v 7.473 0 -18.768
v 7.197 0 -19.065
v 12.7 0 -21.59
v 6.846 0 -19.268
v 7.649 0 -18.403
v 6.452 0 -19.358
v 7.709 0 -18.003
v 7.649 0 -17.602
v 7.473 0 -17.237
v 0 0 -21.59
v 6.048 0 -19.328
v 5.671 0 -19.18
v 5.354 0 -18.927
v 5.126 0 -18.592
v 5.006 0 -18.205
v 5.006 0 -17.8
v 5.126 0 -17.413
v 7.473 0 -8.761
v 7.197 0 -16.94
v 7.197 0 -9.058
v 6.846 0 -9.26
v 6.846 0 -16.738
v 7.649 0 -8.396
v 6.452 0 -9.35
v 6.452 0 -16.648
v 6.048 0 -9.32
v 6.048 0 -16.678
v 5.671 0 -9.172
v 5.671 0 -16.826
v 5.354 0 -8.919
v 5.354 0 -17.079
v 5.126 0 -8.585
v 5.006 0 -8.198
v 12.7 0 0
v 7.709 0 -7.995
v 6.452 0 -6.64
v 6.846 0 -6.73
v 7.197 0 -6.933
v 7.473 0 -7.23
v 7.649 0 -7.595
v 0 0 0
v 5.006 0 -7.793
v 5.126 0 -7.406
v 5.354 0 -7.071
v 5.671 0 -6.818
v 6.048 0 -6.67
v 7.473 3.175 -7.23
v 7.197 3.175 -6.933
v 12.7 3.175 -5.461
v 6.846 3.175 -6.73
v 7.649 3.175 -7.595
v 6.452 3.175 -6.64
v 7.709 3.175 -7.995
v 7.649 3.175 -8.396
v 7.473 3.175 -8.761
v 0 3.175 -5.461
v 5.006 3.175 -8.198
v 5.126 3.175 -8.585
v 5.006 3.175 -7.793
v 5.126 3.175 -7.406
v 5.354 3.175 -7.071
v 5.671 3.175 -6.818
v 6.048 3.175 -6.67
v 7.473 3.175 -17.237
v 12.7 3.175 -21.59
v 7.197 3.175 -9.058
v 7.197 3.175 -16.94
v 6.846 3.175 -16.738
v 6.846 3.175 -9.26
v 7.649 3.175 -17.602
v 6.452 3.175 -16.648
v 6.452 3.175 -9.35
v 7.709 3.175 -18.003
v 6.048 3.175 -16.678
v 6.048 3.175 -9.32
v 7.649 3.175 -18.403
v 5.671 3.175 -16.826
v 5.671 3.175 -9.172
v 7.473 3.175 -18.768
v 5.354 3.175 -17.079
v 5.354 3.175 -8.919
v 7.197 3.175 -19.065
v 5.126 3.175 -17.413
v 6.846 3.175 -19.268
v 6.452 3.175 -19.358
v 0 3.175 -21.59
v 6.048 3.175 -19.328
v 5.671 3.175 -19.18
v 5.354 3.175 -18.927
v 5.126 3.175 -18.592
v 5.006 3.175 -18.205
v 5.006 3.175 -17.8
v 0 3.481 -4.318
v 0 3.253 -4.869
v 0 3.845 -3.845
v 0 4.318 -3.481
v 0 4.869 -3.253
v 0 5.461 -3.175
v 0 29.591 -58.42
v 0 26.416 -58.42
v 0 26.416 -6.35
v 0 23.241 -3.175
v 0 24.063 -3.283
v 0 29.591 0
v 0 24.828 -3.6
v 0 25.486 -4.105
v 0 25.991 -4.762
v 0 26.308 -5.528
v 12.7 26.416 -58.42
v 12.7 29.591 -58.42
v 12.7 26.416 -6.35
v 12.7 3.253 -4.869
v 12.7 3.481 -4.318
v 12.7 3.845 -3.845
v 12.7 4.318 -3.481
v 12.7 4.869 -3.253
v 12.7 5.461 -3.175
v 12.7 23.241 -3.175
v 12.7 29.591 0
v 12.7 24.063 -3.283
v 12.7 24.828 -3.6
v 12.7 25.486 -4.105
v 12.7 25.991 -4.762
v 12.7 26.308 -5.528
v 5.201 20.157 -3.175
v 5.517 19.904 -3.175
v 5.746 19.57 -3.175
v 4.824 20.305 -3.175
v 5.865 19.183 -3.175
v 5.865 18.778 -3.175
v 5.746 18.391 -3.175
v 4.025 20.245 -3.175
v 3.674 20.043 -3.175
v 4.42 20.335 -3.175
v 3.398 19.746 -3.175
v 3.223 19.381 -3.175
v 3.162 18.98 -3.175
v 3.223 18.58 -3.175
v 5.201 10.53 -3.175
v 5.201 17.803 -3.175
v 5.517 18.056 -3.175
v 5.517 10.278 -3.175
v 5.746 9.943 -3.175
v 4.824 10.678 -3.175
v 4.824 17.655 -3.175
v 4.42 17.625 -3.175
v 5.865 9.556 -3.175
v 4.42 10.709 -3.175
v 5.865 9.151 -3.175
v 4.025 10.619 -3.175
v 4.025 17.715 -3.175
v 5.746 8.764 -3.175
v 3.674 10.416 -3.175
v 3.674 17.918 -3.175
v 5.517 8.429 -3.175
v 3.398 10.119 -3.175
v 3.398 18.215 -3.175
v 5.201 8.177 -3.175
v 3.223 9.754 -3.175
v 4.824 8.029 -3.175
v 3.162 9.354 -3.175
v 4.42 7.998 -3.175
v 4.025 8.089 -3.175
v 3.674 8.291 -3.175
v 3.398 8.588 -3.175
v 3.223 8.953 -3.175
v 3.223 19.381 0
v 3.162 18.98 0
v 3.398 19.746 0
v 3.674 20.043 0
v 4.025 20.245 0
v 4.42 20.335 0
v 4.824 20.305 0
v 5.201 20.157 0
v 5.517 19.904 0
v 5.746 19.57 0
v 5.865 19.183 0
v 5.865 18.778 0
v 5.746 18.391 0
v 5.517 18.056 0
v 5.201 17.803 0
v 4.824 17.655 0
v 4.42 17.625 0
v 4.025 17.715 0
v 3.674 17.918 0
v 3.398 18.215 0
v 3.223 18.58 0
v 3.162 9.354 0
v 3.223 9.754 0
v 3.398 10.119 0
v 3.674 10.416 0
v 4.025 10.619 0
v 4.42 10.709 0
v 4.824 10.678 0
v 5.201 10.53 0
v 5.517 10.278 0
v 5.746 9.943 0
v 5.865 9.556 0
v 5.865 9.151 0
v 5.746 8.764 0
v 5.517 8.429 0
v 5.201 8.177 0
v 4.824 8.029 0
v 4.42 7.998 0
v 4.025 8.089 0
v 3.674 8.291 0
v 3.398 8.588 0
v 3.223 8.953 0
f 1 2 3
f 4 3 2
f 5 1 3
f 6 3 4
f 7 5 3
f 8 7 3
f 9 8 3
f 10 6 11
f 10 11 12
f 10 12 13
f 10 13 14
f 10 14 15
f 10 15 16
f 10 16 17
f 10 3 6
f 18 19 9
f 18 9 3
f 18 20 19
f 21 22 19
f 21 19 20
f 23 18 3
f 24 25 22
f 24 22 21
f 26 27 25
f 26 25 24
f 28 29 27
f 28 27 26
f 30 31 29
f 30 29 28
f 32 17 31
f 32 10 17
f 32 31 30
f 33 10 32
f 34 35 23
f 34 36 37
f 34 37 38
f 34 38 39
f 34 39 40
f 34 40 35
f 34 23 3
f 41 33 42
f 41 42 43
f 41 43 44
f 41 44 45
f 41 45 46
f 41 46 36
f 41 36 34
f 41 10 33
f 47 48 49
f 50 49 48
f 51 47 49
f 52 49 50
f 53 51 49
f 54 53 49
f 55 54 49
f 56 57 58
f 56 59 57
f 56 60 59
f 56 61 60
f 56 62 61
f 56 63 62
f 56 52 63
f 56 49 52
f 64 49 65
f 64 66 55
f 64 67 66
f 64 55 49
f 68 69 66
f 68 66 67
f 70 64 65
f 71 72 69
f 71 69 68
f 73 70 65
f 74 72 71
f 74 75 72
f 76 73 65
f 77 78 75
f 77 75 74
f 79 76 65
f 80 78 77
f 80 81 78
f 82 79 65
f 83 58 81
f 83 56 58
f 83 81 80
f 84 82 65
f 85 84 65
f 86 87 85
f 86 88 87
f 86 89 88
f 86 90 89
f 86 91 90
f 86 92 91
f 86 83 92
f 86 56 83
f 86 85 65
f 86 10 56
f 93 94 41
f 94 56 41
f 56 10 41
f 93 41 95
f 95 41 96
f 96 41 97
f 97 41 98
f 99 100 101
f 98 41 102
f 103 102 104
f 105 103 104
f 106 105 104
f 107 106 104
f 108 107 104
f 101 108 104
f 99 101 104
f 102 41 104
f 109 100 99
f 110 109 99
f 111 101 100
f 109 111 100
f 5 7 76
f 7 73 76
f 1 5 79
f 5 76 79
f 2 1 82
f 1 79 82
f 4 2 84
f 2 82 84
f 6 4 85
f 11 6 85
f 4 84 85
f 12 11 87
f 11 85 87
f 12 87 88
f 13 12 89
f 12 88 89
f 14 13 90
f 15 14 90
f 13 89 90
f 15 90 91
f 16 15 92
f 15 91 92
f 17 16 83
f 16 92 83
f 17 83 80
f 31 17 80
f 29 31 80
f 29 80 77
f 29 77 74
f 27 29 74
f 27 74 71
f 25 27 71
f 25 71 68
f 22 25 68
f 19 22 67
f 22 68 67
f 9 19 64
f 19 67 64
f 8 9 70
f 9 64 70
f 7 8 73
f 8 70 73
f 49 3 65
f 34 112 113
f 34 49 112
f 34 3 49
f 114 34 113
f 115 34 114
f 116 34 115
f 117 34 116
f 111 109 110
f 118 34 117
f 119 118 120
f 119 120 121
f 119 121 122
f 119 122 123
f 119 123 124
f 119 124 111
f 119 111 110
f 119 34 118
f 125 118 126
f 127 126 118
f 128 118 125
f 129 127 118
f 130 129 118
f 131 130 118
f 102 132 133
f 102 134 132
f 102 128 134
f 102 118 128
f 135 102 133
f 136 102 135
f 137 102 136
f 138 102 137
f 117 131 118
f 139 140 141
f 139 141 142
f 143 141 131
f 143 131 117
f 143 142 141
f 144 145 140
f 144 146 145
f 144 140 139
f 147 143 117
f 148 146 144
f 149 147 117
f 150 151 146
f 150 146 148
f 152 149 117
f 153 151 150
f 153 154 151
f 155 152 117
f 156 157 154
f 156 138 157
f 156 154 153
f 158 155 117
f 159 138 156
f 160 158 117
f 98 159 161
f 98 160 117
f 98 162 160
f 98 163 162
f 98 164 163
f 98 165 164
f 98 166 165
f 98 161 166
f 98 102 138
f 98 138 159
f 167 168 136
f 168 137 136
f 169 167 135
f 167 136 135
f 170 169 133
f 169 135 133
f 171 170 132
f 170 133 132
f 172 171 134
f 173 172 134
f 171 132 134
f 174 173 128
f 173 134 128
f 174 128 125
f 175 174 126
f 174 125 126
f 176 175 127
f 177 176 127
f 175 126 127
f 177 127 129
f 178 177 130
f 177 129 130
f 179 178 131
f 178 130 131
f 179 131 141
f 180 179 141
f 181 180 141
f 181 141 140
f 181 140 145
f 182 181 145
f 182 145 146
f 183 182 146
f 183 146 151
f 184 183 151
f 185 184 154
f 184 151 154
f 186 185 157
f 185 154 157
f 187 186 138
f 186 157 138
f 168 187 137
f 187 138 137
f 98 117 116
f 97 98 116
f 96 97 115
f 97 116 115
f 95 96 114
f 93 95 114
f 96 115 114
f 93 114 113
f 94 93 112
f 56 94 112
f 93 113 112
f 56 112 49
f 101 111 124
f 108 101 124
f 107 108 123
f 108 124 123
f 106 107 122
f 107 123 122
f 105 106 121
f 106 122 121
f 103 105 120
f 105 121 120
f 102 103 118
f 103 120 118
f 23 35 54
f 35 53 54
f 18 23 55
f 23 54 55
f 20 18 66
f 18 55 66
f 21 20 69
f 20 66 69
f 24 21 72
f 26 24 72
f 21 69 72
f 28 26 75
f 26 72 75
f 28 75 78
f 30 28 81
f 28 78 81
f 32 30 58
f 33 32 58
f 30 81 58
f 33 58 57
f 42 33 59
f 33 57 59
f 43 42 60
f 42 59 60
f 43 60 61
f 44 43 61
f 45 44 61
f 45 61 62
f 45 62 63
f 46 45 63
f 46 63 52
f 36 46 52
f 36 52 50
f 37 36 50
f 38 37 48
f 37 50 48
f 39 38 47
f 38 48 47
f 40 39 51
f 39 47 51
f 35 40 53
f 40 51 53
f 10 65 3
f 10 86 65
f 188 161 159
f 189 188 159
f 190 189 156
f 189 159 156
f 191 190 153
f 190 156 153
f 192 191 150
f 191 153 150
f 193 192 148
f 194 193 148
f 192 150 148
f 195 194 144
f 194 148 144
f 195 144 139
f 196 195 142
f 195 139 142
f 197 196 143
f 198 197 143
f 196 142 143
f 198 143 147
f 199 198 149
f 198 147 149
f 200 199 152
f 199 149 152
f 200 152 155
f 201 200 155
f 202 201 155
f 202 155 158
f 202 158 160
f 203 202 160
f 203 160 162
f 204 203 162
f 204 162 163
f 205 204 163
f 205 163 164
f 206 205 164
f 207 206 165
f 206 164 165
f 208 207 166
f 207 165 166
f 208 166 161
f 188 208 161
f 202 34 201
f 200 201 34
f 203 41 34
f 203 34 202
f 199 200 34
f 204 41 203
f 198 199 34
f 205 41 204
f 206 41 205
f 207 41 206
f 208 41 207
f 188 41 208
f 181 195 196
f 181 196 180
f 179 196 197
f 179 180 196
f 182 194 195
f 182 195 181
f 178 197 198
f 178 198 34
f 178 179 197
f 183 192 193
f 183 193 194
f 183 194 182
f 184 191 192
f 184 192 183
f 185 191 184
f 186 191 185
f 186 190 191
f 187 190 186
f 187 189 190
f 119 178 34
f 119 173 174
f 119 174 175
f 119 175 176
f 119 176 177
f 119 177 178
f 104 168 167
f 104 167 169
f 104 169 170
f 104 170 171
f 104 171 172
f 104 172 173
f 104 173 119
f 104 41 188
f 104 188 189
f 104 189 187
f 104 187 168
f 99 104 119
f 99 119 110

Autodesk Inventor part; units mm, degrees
ref_plane "YZ Plane" through (0, 0, 0) normal (1, 0, 0) x (0, 1, 0)
ref_plane "XZ Plane" through (0, 0, 0) normal (0, 1, 0) x (-1, 0, 0)
ref_plane "XY Plane" through (0, 0, 0) normal (0, 0, 1) x (1, 0, 0)
sketch "Sketch1" plane through (0, 0, 0) normal (1, 0, 0) x (0, 1, 0)
  line L0 (0, 0) -> (3.175, 0)
  line L1 (3.175, 0) -> (3.175, -21.59)
  line L2 (3.175, -21.59) -> (0, -21.59)
  line L3 (0, -21.59) -> (0, 0)
  line L4 (0, 0) -> (29.591, 0)
  line L5 (29.591, 0) -> (29.591, -3.175)
  line L6 (29.591, -3.175) -> (0, -3.175)
  line L7 (0, -3.175) -> (0, 0)
  line L8 (29.591, 0) -> (26.416, 0)
  line L9 (26.416, 0) -> (26.416, -58.42)
  line L10 (26.416, -58.42) -> (29.591, -58.42)
  line L11 (29.591, -58.42) -> (29.591, 0)
  dimension "d0" = 3.175
  dimension "d1" = 21.59
  dimension "d4" = 3.175
  dimension "d5" = 29.591
  dimension "d6" = 3.175
  dimension "d7" = 58.42
extrude "Extrusion1" add sketch "Sketch1" along normal blind 12.7
sketch "Sketch2" plane through (0, 3.175, -3.175) normal (0, 0, -1) x (-1, 0, 0)
  circle A0 centre (-4.5212, 15.8052) radius 1.3589
  circle A1 centre (-4.5212, 6.1786) radius 1.3589
  line L0 (-12.7, 0) -> (-12.7, 23.241) projected
  point P0 (0, -3.175)
  dimension "d8" = 2.7178
  dimension "d9" = 2.7178
  dimension "d10" = 8.1788
  dimension "d11" = 8.1788
  dimension "d12" = 9.6266
extrude "Extrusion2" cut sketch "Sketch2" against normal blind 25.4
sketch "Sketch3" plane through (0, 3.175, -3.175) normal (0, 1, 0) x (1, 0, 0)
  circle A0 centre (6.35, 4.8202) radius 1.3589
  circle A1 centre (6.35, 14.8278) radius 1.3589
  line L0 (0, 18.415) -> (0, 0) projected
  point P0 (0, -3.175)
  dimension "d15" = 2.7178
  dimension "d16" = 2.7178
  dimension "d17" = 6.35
  dimension "d18" = 6.35
  dimension "d23" = 10.0076
extrude "Extrusion3" cut sketch "Sketch3" against normal blind 25.4
fillet "Fillet1" radius 3.175 1 edges at (6.35, 26.416, -3.175)
fillet "Fillet2" radius 2.286 1 edges at (6.35, 3.175, -3.175)
equation "\"d4\" = d0"
equation "\"d6\" = d0"
properties part number "U bracket"
